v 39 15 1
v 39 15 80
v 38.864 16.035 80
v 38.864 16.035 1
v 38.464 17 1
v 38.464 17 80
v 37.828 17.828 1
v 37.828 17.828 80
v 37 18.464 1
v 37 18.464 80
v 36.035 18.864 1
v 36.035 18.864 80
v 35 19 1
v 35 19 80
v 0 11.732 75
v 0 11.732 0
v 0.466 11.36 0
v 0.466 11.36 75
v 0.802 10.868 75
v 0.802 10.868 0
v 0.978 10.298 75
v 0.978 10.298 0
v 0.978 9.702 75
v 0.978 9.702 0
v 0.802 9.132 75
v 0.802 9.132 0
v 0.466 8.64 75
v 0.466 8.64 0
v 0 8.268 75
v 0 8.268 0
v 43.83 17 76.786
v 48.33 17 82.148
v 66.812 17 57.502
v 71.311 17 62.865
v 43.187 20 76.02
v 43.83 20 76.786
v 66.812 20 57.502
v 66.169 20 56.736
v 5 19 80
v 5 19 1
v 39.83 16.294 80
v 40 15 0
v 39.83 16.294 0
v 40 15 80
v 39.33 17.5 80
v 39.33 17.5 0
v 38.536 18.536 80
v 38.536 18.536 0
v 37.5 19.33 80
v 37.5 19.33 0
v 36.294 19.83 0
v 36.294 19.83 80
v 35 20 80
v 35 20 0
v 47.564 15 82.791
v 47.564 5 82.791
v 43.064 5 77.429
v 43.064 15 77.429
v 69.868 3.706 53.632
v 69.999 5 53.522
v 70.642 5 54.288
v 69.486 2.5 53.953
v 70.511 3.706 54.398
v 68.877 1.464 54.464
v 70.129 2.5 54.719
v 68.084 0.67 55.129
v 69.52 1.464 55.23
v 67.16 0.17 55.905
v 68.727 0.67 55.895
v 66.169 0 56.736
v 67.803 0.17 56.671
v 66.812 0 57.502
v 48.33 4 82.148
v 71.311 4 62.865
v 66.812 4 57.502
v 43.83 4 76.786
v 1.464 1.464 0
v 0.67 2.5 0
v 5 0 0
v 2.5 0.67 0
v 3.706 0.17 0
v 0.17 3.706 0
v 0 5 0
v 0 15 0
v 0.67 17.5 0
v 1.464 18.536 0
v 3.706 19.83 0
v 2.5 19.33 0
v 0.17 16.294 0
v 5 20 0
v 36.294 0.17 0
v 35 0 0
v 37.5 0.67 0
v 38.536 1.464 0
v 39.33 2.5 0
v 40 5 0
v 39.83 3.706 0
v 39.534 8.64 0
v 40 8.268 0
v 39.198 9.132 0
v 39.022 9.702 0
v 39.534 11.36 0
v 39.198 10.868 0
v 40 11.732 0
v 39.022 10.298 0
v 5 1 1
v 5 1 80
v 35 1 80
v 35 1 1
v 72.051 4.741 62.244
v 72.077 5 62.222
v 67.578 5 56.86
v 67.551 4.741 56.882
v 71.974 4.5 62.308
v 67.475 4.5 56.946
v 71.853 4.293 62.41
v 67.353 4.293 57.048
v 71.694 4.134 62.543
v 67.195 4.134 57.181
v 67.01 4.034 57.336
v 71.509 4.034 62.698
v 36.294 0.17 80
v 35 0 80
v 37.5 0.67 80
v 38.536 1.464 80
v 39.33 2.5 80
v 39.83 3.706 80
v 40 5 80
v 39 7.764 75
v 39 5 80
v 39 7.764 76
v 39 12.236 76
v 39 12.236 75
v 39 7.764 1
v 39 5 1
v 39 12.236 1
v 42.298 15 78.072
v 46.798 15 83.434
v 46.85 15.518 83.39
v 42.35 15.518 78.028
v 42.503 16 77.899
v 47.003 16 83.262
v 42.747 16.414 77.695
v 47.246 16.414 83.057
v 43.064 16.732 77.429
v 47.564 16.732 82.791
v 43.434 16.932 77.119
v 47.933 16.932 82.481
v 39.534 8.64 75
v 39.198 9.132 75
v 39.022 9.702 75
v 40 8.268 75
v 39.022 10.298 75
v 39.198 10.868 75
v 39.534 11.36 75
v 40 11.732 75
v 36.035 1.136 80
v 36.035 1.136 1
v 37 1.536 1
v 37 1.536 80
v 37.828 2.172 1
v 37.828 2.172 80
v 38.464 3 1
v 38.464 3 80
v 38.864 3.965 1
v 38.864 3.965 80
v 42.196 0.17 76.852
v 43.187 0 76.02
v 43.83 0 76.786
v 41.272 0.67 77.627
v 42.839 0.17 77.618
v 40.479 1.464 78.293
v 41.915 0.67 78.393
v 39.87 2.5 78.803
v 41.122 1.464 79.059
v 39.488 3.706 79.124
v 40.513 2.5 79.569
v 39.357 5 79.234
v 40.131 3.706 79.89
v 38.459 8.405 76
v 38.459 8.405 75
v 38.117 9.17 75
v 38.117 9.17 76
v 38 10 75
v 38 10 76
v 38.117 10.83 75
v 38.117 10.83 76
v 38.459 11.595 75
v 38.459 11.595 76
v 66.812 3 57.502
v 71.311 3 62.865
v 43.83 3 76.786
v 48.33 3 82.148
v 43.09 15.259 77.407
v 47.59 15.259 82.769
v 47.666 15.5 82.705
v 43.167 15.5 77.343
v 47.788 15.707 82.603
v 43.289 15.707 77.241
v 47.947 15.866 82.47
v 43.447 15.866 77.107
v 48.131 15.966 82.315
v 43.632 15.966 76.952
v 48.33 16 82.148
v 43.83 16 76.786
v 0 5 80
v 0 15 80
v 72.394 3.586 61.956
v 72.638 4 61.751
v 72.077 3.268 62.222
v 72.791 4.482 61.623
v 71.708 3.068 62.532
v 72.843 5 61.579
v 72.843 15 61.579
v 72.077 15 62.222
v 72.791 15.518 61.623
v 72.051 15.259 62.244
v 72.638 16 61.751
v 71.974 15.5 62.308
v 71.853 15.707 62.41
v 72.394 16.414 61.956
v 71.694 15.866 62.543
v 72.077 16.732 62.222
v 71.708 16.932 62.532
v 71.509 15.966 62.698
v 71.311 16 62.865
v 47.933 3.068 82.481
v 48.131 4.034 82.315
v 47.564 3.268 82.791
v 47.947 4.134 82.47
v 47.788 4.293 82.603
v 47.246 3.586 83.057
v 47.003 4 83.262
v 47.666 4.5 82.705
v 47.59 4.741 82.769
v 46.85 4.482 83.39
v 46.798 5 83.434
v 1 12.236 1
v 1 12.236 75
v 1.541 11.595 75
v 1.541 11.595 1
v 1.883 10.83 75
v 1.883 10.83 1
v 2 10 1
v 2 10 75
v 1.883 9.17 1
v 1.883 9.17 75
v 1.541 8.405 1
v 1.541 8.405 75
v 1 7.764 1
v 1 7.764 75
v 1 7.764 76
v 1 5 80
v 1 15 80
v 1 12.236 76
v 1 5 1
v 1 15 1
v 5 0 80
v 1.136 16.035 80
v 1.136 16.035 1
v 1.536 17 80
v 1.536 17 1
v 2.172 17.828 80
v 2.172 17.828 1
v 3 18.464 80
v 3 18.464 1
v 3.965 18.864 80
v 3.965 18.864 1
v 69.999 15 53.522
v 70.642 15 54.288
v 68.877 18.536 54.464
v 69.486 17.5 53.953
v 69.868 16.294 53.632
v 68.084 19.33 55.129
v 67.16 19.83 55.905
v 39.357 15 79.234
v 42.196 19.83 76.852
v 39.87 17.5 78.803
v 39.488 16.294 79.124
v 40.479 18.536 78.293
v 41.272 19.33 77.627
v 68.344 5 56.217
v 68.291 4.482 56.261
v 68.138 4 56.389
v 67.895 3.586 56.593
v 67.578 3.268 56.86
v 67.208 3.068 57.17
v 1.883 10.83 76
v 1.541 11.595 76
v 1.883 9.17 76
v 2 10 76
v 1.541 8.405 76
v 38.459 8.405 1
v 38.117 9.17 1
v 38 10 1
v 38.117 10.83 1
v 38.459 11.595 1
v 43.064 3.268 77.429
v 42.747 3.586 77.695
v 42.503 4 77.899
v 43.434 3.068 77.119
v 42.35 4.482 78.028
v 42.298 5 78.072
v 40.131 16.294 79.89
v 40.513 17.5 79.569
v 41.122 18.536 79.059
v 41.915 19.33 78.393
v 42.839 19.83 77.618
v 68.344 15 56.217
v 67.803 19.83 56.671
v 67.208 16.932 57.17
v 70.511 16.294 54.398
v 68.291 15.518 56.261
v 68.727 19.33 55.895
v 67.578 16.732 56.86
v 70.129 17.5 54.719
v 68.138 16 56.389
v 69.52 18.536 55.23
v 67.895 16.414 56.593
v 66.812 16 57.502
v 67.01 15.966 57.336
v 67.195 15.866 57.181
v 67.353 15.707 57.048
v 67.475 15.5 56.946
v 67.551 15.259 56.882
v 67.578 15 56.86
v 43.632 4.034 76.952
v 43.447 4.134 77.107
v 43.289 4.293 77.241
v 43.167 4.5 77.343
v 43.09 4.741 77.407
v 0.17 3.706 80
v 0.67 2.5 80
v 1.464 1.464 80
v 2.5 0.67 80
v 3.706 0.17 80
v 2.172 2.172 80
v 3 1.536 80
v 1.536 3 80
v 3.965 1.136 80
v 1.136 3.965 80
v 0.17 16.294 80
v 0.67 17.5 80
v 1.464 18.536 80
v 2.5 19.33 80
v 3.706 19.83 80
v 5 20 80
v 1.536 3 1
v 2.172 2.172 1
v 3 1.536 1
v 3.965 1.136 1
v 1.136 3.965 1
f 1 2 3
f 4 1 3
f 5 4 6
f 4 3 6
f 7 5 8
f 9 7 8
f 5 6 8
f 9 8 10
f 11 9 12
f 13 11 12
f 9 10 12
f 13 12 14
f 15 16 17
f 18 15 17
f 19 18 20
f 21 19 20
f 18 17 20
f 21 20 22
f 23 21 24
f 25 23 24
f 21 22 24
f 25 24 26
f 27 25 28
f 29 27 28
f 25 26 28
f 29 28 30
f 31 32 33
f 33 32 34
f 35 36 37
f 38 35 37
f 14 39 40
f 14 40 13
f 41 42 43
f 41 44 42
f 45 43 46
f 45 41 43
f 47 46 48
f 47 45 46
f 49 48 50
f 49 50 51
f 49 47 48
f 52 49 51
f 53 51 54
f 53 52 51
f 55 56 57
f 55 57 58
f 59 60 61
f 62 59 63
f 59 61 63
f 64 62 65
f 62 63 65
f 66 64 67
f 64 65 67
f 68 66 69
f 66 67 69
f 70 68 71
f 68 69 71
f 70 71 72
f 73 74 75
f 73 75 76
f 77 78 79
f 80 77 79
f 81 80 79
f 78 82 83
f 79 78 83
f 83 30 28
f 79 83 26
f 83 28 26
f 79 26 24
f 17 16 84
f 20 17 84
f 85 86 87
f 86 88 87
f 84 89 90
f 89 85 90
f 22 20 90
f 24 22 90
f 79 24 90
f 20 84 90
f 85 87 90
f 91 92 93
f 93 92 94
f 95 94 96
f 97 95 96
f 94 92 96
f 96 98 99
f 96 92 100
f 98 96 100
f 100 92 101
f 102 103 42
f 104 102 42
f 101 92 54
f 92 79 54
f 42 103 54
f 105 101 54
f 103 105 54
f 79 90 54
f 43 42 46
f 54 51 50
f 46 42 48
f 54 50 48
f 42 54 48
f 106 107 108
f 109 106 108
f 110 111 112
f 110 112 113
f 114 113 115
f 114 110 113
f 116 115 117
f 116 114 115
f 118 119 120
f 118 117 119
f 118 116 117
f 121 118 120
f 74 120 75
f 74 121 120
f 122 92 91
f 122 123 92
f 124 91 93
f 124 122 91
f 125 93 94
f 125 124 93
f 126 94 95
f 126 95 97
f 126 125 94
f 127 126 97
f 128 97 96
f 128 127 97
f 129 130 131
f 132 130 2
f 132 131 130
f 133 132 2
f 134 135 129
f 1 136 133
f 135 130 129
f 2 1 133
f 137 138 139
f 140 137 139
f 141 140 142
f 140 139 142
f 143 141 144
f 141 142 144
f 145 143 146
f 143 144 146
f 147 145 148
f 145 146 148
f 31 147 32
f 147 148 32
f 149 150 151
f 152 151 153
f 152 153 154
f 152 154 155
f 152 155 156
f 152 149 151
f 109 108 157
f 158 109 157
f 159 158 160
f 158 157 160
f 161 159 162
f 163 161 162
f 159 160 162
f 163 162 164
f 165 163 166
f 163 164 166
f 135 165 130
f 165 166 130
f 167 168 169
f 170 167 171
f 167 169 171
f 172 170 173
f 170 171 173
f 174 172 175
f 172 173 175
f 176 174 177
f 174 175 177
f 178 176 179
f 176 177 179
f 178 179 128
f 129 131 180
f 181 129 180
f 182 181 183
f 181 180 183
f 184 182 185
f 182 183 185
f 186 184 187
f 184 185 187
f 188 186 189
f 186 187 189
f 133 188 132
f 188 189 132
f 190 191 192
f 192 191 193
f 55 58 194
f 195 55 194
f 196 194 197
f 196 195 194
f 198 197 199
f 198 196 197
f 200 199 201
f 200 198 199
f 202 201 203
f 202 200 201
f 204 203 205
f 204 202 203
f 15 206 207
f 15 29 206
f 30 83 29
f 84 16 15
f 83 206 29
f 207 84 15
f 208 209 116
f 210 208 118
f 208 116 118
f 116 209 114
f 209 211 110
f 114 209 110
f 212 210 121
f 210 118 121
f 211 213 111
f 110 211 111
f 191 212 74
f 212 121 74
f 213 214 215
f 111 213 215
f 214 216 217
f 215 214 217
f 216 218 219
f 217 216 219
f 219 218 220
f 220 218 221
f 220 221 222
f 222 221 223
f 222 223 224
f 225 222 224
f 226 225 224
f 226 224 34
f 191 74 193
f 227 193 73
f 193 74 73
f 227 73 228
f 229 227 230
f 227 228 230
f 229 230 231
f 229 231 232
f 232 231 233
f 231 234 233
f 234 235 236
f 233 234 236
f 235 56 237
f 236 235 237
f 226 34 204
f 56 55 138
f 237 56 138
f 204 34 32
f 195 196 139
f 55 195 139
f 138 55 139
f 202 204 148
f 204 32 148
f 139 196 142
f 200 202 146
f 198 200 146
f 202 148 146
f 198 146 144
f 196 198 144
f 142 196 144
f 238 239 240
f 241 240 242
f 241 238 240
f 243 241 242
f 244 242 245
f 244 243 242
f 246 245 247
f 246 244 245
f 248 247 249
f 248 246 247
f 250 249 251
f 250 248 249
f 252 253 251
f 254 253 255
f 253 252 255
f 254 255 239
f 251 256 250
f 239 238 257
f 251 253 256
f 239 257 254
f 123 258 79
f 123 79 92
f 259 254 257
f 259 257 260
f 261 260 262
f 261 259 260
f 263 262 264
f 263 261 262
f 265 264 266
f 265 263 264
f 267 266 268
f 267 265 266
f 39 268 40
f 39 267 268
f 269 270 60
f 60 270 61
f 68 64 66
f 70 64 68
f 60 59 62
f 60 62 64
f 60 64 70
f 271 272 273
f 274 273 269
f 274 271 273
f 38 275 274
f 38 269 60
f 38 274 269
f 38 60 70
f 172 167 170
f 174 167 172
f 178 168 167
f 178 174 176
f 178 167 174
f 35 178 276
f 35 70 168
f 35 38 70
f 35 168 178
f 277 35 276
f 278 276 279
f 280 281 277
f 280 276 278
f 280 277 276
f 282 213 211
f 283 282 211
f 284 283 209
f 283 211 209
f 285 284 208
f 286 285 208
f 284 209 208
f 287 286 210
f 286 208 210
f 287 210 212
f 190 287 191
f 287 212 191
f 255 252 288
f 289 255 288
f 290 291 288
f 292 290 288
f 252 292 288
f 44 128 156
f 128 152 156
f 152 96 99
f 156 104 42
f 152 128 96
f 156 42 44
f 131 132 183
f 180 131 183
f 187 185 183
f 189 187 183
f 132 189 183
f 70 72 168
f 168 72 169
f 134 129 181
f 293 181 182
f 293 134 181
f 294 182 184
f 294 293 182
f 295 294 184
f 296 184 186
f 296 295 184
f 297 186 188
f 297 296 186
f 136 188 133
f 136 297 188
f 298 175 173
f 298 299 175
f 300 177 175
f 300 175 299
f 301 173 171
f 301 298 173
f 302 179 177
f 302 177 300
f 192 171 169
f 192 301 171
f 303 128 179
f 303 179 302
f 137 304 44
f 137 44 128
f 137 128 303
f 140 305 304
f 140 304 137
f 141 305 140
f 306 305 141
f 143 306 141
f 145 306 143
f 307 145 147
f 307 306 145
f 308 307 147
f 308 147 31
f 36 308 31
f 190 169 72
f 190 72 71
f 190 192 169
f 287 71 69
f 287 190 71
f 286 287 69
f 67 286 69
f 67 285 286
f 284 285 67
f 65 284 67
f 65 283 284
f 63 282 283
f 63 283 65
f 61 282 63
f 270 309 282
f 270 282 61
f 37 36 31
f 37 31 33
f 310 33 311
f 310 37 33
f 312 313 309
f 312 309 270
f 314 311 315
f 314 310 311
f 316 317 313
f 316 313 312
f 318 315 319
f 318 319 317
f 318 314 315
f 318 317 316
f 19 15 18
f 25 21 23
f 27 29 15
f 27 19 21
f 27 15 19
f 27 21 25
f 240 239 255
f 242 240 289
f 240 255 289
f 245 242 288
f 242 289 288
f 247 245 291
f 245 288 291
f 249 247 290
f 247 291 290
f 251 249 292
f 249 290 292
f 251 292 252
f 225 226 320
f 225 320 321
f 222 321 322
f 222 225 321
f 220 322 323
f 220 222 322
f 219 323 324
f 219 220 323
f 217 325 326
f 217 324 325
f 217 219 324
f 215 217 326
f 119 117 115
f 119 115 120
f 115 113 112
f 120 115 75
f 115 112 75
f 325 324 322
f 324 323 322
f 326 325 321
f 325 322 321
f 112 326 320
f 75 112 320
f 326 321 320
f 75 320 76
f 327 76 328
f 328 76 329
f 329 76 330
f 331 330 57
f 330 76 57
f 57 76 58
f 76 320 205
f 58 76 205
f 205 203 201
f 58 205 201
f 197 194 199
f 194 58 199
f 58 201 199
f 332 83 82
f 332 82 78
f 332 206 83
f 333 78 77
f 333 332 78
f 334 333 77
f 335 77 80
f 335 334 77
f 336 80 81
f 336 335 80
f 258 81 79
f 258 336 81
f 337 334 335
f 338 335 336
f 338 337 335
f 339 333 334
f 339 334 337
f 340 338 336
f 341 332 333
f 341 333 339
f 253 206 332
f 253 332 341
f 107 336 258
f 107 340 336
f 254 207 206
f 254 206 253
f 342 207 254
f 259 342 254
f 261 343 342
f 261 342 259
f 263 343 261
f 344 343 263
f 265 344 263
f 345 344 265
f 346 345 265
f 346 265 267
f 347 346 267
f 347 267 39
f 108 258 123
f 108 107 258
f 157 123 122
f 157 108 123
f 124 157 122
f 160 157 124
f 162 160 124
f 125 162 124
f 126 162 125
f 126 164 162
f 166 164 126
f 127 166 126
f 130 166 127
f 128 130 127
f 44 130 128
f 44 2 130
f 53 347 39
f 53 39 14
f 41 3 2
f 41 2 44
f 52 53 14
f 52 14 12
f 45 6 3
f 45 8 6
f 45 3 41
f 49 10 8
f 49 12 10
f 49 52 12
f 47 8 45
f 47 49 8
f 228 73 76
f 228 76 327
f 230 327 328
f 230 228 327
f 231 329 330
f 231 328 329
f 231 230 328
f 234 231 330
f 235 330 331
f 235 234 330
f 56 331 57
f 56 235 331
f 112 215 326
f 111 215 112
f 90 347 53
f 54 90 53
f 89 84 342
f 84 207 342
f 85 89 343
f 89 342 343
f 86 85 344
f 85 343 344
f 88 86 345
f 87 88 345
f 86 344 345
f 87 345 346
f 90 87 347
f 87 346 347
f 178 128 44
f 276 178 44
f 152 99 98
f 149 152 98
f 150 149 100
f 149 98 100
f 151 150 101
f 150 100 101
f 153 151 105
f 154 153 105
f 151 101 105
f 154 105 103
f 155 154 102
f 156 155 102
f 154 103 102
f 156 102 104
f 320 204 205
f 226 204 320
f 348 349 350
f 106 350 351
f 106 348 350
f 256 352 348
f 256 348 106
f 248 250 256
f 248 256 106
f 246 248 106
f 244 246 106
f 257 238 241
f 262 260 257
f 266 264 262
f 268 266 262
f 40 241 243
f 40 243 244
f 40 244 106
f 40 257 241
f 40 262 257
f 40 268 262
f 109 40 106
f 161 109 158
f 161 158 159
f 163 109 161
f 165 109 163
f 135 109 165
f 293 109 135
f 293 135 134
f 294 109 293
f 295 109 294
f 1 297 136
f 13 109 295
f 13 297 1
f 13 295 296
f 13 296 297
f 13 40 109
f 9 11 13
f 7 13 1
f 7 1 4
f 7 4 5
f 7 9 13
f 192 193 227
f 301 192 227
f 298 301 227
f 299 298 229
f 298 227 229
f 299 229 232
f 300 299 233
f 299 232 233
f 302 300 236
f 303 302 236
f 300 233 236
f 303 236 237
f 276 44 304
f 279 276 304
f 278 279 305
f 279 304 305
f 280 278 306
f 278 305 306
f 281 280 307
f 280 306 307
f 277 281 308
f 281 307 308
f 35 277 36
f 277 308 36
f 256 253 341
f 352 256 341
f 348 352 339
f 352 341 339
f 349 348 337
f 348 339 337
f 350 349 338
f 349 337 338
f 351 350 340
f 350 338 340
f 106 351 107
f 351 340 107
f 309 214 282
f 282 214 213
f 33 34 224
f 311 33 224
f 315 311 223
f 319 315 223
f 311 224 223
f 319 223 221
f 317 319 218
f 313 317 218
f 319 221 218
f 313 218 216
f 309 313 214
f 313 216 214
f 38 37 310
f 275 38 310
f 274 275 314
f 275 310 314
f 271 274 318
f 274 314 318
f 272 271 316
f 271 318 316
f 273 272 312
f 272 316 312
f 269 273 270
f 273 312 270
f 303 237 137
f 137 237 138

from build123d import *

# Parameters (mm, degrees)
F0_W        = 40
F0_H        = 20
F1_DEPTH    = 80
F2_R        = 5
F4_DEPTH    = 75
F5_T        = 1
F5_T4_ANGLE = 120.000000001
F5_T6_ANGLE = 120.000000001
F7_DEPTH    = 8
F8_ANGLE    = 220
F11_DEPTH   = 7
F12_T       = -1


# Not quite as in the source:
# - a shell that OpenCascade refuses in one call is made with other operations: the cavity is built on its own and cut out


with BuildPart() as f1:
    # F0 (on Top) → F1 (new body)
    with BuildSketch(Plane.XY):
        with Locations((20, 10)):
            Rectangle(F0_W, F0_H)
    extrude(amount=F1_DEPTH)

    # F2
    f2_edges = [f1.edges().sort_by_distance(p)[0] for p in [
        (40, 0, 40),
        (0, 0, 40),
        (40, 20, 40),
        (0, 20, 40),
    ]]
    fillet(f2_edges, radius=F2_R)

    # F3 (on face) → F4 (cut)
    with BuildSketch(Plane(origin=(0, 0, 0), x_dir=(1, 0, 0), z_dir=(0, 0, -1))):
        with BuildLine():
            Line((0, -8.2679491924), (0, -11.7320508076))
            ThreePointArc((0, -11.7320508076), (1, -10), (0, -8.2679491924))
        make_face()
        with BuildLine():
            ThreePointArc((40, -8.2679491924), (39, -10), (40, -11.7320508076))
            Line((40, -11.7320508076), (40, -8.2679491924))
        make_face()
    extrude(amount=-F4_DEPTH, mode=Mode.SUBTRACT)

    # F5: shell of thickness 1, made by hand


with BuildPart() as f5_core1:
    # F5_t2: copy of F1
    add(f1.part)

    # the walls: a layer under each face that stays
    f5_faces = [f5_core1.faces().sort_by_distance(p)[0] for p in [
        (0, 13.3333333333, 66.6666666667),
        (20, 10, 0),
        (1, 10, 37.5),
        (0.5, 10, 75),
        (1.4644660941, 1.4644660941, 40),
        (1.4644660941, 18.5355339059, 40),
        (20, 20, 40),
        (38.5355339059, 18.5355339059, 40),
        (40, 6.6666666667, 66.6666666667),
        (39, 10, 37.5),
        (38.5355339059, 1.4644660941, 40),
        (20, 0, 40),
        (39.5, 10, 75),
    ]]
    thicken(f5_faces, amount=-F5_T, mode=Mode.SUBTRACT)

    # F5_s3 → F5_t4 (revolve, cut)
    with BuildSketch(Plane(origin=(-5.0801270189, 2.9330127019, 0), x_dir=(0, 0, 1), z_dir=(-0.8660254038, 0.5, 0))):
        Polygon((74.99, 10.1502540378), (75, 11.1602540378), (76, 11.1602540378), (76, 10.1602540378), align=None)
    revolve(axis=Axis((-1, 10, 75), (0, 0, -1)), revolution_arc=F5_T4_ANGLE, mode=Mode.SUBTRACT)

    # F5_s5 → F5_t6 (revolve, cut)
    with BuildSketch(Plane(origin=(26.4198729811, -15.2535207776, 0), x_dir=(0, 0, 1), z_dir=(0.8660254038, -0.5, 0))):
        Polygon((74.99, -27.1702540378), (75, -26.1602540378), (76, -26.1602540378), (76, -27.1602540378), align=None)
    revolve(axis=Axis((41, 10, 75), (0, 0, -1)), revolution_arc=F5_T6_ANGLE, mode=Mode.SUBTRACT)


with BuildPart() as f1_1:
    add(f1.part)

    # what is left inside the walls is the cavity
    f5_cavity = [f5_core1.part.solids().sort_by_distance(p)[0] for p in [
        (20, 1.01, 53.666667),
    ]]
    add(f5_cavity, mode=Mode.SUBTRACT)


with BuildPart() as f7:
    # F6 (on face) → F7 (new body)
    with BuildSketch(Plane.XY.offset(80)):
        with BuildLine():
            ThreePointArc((35, 0), (38.5355339059, 1.4644660941), (40, 5))
            Line((40, 5), (40, 15))
            ThreePointArc((40, 15), (38.5355339059, 18.5355339059), (35, 20))
            Line((35, 20), (5, 20))
            ThreePointArc((5, 20), (1.4644660941, 18.5355339059), (0, 15))
            Line((0, 15), (0, 5))
            ThreePointArc((0, 5), (1.4644660941, 1.4644660941), (5, 0))
            Line((5, 0), (35, 0))
        make_face()
    extrude(amount=F7_DEPTH)


with BuildPart() as f7_1:
    # F8: moved
    add(f7.part.rotate(Axis((40, 10, 80), (0, 1, 0)), F8_ANGLE))


with BuildPart() as f7_2:
    # F9: moved
    add(f7_1.part.moved(Location((4.4995132678, 0, 5.3623111018))))

    # F10 (on face) → F11 (cut)
    with BuildSketch(Plane(origin=(60.418859835, 0, 72.0043932688), x_dir=(0.7660444431, 0, -0.6427876097), z_dir=(0.6427876097, 0, 0.7660444431))):
        with BuildLine():
            ThreePointArc((19.2187689498, 15), (17.7543028558, 18.5355339059), (14.2187689498, 20))
            Line((14.2187689498, 20), (-15.7812310502, 20))
            ThreePointArc((-15.7812310502, 20), (-19.3167649561, 18.5355339059), (-20.7812310502, 15))
            Line((-20.7812310502, 15), (-20.7812310502, 5))
            ThreePointArc((-20.7812310502, 5), (-19.3167649561, 1.4644660941), (-15.7812310502, 0))
            Line((-15.7812310502, 0), (14.2187689498, 0))
            ThreePointArc((14.2187689498, 0), (17.7543028558, 1.4644660941), (19.2187689498, 5))
            Line((19.2187689498, 5), (19.2187689498, 15))
        make_face()
        with BuildLine():
            ThreePointArc((14.2187689498, 17.0000009239), (15.6329831655, 16.4142142156), (16.2187698737, 15))
            Line((16.2187698737, 15), (16.2187698737, 5))
            ThreePointArc((16.2187698737, 5), (15.6329831655, 3.5857857844), (14.2187689498, 2.9999990761))
            Line((14.2187689498, 2.9999990761), (-15.7812310502, 2.9999990761))
            ThreePointArc((-15.7812310502, 2.9999990761), (-17.1954452658, 3.5857857844), (-17.781231974, 5))
            Line((-17.781231974, 5), (-17.781231974, 15))
            ThreePointArc((-17.781231974, 15), (-17.1954452658, 16.4142142156), (-15.7812310502, 17.0000009239))
            Line((-15.7812310502, 17.0000009239), (14.2187689498, 17.0000009239))
        make_face(mode=Mode.SUBTRACT)
    extrude(amount=-F11_DEPTH, mode=Mode.SUBTRACT)

    # F12
    f12_openings = [f7_2.faces().sort_by_distance(p)[0] for p in [
        (59.820402, 10, 72.506559),
    ]]
    offset(amount=F12_T, openings=f12_openings, kind=Kind.INTERSECTION)


solid = Compound([f1_1.part, f7_2.part])
